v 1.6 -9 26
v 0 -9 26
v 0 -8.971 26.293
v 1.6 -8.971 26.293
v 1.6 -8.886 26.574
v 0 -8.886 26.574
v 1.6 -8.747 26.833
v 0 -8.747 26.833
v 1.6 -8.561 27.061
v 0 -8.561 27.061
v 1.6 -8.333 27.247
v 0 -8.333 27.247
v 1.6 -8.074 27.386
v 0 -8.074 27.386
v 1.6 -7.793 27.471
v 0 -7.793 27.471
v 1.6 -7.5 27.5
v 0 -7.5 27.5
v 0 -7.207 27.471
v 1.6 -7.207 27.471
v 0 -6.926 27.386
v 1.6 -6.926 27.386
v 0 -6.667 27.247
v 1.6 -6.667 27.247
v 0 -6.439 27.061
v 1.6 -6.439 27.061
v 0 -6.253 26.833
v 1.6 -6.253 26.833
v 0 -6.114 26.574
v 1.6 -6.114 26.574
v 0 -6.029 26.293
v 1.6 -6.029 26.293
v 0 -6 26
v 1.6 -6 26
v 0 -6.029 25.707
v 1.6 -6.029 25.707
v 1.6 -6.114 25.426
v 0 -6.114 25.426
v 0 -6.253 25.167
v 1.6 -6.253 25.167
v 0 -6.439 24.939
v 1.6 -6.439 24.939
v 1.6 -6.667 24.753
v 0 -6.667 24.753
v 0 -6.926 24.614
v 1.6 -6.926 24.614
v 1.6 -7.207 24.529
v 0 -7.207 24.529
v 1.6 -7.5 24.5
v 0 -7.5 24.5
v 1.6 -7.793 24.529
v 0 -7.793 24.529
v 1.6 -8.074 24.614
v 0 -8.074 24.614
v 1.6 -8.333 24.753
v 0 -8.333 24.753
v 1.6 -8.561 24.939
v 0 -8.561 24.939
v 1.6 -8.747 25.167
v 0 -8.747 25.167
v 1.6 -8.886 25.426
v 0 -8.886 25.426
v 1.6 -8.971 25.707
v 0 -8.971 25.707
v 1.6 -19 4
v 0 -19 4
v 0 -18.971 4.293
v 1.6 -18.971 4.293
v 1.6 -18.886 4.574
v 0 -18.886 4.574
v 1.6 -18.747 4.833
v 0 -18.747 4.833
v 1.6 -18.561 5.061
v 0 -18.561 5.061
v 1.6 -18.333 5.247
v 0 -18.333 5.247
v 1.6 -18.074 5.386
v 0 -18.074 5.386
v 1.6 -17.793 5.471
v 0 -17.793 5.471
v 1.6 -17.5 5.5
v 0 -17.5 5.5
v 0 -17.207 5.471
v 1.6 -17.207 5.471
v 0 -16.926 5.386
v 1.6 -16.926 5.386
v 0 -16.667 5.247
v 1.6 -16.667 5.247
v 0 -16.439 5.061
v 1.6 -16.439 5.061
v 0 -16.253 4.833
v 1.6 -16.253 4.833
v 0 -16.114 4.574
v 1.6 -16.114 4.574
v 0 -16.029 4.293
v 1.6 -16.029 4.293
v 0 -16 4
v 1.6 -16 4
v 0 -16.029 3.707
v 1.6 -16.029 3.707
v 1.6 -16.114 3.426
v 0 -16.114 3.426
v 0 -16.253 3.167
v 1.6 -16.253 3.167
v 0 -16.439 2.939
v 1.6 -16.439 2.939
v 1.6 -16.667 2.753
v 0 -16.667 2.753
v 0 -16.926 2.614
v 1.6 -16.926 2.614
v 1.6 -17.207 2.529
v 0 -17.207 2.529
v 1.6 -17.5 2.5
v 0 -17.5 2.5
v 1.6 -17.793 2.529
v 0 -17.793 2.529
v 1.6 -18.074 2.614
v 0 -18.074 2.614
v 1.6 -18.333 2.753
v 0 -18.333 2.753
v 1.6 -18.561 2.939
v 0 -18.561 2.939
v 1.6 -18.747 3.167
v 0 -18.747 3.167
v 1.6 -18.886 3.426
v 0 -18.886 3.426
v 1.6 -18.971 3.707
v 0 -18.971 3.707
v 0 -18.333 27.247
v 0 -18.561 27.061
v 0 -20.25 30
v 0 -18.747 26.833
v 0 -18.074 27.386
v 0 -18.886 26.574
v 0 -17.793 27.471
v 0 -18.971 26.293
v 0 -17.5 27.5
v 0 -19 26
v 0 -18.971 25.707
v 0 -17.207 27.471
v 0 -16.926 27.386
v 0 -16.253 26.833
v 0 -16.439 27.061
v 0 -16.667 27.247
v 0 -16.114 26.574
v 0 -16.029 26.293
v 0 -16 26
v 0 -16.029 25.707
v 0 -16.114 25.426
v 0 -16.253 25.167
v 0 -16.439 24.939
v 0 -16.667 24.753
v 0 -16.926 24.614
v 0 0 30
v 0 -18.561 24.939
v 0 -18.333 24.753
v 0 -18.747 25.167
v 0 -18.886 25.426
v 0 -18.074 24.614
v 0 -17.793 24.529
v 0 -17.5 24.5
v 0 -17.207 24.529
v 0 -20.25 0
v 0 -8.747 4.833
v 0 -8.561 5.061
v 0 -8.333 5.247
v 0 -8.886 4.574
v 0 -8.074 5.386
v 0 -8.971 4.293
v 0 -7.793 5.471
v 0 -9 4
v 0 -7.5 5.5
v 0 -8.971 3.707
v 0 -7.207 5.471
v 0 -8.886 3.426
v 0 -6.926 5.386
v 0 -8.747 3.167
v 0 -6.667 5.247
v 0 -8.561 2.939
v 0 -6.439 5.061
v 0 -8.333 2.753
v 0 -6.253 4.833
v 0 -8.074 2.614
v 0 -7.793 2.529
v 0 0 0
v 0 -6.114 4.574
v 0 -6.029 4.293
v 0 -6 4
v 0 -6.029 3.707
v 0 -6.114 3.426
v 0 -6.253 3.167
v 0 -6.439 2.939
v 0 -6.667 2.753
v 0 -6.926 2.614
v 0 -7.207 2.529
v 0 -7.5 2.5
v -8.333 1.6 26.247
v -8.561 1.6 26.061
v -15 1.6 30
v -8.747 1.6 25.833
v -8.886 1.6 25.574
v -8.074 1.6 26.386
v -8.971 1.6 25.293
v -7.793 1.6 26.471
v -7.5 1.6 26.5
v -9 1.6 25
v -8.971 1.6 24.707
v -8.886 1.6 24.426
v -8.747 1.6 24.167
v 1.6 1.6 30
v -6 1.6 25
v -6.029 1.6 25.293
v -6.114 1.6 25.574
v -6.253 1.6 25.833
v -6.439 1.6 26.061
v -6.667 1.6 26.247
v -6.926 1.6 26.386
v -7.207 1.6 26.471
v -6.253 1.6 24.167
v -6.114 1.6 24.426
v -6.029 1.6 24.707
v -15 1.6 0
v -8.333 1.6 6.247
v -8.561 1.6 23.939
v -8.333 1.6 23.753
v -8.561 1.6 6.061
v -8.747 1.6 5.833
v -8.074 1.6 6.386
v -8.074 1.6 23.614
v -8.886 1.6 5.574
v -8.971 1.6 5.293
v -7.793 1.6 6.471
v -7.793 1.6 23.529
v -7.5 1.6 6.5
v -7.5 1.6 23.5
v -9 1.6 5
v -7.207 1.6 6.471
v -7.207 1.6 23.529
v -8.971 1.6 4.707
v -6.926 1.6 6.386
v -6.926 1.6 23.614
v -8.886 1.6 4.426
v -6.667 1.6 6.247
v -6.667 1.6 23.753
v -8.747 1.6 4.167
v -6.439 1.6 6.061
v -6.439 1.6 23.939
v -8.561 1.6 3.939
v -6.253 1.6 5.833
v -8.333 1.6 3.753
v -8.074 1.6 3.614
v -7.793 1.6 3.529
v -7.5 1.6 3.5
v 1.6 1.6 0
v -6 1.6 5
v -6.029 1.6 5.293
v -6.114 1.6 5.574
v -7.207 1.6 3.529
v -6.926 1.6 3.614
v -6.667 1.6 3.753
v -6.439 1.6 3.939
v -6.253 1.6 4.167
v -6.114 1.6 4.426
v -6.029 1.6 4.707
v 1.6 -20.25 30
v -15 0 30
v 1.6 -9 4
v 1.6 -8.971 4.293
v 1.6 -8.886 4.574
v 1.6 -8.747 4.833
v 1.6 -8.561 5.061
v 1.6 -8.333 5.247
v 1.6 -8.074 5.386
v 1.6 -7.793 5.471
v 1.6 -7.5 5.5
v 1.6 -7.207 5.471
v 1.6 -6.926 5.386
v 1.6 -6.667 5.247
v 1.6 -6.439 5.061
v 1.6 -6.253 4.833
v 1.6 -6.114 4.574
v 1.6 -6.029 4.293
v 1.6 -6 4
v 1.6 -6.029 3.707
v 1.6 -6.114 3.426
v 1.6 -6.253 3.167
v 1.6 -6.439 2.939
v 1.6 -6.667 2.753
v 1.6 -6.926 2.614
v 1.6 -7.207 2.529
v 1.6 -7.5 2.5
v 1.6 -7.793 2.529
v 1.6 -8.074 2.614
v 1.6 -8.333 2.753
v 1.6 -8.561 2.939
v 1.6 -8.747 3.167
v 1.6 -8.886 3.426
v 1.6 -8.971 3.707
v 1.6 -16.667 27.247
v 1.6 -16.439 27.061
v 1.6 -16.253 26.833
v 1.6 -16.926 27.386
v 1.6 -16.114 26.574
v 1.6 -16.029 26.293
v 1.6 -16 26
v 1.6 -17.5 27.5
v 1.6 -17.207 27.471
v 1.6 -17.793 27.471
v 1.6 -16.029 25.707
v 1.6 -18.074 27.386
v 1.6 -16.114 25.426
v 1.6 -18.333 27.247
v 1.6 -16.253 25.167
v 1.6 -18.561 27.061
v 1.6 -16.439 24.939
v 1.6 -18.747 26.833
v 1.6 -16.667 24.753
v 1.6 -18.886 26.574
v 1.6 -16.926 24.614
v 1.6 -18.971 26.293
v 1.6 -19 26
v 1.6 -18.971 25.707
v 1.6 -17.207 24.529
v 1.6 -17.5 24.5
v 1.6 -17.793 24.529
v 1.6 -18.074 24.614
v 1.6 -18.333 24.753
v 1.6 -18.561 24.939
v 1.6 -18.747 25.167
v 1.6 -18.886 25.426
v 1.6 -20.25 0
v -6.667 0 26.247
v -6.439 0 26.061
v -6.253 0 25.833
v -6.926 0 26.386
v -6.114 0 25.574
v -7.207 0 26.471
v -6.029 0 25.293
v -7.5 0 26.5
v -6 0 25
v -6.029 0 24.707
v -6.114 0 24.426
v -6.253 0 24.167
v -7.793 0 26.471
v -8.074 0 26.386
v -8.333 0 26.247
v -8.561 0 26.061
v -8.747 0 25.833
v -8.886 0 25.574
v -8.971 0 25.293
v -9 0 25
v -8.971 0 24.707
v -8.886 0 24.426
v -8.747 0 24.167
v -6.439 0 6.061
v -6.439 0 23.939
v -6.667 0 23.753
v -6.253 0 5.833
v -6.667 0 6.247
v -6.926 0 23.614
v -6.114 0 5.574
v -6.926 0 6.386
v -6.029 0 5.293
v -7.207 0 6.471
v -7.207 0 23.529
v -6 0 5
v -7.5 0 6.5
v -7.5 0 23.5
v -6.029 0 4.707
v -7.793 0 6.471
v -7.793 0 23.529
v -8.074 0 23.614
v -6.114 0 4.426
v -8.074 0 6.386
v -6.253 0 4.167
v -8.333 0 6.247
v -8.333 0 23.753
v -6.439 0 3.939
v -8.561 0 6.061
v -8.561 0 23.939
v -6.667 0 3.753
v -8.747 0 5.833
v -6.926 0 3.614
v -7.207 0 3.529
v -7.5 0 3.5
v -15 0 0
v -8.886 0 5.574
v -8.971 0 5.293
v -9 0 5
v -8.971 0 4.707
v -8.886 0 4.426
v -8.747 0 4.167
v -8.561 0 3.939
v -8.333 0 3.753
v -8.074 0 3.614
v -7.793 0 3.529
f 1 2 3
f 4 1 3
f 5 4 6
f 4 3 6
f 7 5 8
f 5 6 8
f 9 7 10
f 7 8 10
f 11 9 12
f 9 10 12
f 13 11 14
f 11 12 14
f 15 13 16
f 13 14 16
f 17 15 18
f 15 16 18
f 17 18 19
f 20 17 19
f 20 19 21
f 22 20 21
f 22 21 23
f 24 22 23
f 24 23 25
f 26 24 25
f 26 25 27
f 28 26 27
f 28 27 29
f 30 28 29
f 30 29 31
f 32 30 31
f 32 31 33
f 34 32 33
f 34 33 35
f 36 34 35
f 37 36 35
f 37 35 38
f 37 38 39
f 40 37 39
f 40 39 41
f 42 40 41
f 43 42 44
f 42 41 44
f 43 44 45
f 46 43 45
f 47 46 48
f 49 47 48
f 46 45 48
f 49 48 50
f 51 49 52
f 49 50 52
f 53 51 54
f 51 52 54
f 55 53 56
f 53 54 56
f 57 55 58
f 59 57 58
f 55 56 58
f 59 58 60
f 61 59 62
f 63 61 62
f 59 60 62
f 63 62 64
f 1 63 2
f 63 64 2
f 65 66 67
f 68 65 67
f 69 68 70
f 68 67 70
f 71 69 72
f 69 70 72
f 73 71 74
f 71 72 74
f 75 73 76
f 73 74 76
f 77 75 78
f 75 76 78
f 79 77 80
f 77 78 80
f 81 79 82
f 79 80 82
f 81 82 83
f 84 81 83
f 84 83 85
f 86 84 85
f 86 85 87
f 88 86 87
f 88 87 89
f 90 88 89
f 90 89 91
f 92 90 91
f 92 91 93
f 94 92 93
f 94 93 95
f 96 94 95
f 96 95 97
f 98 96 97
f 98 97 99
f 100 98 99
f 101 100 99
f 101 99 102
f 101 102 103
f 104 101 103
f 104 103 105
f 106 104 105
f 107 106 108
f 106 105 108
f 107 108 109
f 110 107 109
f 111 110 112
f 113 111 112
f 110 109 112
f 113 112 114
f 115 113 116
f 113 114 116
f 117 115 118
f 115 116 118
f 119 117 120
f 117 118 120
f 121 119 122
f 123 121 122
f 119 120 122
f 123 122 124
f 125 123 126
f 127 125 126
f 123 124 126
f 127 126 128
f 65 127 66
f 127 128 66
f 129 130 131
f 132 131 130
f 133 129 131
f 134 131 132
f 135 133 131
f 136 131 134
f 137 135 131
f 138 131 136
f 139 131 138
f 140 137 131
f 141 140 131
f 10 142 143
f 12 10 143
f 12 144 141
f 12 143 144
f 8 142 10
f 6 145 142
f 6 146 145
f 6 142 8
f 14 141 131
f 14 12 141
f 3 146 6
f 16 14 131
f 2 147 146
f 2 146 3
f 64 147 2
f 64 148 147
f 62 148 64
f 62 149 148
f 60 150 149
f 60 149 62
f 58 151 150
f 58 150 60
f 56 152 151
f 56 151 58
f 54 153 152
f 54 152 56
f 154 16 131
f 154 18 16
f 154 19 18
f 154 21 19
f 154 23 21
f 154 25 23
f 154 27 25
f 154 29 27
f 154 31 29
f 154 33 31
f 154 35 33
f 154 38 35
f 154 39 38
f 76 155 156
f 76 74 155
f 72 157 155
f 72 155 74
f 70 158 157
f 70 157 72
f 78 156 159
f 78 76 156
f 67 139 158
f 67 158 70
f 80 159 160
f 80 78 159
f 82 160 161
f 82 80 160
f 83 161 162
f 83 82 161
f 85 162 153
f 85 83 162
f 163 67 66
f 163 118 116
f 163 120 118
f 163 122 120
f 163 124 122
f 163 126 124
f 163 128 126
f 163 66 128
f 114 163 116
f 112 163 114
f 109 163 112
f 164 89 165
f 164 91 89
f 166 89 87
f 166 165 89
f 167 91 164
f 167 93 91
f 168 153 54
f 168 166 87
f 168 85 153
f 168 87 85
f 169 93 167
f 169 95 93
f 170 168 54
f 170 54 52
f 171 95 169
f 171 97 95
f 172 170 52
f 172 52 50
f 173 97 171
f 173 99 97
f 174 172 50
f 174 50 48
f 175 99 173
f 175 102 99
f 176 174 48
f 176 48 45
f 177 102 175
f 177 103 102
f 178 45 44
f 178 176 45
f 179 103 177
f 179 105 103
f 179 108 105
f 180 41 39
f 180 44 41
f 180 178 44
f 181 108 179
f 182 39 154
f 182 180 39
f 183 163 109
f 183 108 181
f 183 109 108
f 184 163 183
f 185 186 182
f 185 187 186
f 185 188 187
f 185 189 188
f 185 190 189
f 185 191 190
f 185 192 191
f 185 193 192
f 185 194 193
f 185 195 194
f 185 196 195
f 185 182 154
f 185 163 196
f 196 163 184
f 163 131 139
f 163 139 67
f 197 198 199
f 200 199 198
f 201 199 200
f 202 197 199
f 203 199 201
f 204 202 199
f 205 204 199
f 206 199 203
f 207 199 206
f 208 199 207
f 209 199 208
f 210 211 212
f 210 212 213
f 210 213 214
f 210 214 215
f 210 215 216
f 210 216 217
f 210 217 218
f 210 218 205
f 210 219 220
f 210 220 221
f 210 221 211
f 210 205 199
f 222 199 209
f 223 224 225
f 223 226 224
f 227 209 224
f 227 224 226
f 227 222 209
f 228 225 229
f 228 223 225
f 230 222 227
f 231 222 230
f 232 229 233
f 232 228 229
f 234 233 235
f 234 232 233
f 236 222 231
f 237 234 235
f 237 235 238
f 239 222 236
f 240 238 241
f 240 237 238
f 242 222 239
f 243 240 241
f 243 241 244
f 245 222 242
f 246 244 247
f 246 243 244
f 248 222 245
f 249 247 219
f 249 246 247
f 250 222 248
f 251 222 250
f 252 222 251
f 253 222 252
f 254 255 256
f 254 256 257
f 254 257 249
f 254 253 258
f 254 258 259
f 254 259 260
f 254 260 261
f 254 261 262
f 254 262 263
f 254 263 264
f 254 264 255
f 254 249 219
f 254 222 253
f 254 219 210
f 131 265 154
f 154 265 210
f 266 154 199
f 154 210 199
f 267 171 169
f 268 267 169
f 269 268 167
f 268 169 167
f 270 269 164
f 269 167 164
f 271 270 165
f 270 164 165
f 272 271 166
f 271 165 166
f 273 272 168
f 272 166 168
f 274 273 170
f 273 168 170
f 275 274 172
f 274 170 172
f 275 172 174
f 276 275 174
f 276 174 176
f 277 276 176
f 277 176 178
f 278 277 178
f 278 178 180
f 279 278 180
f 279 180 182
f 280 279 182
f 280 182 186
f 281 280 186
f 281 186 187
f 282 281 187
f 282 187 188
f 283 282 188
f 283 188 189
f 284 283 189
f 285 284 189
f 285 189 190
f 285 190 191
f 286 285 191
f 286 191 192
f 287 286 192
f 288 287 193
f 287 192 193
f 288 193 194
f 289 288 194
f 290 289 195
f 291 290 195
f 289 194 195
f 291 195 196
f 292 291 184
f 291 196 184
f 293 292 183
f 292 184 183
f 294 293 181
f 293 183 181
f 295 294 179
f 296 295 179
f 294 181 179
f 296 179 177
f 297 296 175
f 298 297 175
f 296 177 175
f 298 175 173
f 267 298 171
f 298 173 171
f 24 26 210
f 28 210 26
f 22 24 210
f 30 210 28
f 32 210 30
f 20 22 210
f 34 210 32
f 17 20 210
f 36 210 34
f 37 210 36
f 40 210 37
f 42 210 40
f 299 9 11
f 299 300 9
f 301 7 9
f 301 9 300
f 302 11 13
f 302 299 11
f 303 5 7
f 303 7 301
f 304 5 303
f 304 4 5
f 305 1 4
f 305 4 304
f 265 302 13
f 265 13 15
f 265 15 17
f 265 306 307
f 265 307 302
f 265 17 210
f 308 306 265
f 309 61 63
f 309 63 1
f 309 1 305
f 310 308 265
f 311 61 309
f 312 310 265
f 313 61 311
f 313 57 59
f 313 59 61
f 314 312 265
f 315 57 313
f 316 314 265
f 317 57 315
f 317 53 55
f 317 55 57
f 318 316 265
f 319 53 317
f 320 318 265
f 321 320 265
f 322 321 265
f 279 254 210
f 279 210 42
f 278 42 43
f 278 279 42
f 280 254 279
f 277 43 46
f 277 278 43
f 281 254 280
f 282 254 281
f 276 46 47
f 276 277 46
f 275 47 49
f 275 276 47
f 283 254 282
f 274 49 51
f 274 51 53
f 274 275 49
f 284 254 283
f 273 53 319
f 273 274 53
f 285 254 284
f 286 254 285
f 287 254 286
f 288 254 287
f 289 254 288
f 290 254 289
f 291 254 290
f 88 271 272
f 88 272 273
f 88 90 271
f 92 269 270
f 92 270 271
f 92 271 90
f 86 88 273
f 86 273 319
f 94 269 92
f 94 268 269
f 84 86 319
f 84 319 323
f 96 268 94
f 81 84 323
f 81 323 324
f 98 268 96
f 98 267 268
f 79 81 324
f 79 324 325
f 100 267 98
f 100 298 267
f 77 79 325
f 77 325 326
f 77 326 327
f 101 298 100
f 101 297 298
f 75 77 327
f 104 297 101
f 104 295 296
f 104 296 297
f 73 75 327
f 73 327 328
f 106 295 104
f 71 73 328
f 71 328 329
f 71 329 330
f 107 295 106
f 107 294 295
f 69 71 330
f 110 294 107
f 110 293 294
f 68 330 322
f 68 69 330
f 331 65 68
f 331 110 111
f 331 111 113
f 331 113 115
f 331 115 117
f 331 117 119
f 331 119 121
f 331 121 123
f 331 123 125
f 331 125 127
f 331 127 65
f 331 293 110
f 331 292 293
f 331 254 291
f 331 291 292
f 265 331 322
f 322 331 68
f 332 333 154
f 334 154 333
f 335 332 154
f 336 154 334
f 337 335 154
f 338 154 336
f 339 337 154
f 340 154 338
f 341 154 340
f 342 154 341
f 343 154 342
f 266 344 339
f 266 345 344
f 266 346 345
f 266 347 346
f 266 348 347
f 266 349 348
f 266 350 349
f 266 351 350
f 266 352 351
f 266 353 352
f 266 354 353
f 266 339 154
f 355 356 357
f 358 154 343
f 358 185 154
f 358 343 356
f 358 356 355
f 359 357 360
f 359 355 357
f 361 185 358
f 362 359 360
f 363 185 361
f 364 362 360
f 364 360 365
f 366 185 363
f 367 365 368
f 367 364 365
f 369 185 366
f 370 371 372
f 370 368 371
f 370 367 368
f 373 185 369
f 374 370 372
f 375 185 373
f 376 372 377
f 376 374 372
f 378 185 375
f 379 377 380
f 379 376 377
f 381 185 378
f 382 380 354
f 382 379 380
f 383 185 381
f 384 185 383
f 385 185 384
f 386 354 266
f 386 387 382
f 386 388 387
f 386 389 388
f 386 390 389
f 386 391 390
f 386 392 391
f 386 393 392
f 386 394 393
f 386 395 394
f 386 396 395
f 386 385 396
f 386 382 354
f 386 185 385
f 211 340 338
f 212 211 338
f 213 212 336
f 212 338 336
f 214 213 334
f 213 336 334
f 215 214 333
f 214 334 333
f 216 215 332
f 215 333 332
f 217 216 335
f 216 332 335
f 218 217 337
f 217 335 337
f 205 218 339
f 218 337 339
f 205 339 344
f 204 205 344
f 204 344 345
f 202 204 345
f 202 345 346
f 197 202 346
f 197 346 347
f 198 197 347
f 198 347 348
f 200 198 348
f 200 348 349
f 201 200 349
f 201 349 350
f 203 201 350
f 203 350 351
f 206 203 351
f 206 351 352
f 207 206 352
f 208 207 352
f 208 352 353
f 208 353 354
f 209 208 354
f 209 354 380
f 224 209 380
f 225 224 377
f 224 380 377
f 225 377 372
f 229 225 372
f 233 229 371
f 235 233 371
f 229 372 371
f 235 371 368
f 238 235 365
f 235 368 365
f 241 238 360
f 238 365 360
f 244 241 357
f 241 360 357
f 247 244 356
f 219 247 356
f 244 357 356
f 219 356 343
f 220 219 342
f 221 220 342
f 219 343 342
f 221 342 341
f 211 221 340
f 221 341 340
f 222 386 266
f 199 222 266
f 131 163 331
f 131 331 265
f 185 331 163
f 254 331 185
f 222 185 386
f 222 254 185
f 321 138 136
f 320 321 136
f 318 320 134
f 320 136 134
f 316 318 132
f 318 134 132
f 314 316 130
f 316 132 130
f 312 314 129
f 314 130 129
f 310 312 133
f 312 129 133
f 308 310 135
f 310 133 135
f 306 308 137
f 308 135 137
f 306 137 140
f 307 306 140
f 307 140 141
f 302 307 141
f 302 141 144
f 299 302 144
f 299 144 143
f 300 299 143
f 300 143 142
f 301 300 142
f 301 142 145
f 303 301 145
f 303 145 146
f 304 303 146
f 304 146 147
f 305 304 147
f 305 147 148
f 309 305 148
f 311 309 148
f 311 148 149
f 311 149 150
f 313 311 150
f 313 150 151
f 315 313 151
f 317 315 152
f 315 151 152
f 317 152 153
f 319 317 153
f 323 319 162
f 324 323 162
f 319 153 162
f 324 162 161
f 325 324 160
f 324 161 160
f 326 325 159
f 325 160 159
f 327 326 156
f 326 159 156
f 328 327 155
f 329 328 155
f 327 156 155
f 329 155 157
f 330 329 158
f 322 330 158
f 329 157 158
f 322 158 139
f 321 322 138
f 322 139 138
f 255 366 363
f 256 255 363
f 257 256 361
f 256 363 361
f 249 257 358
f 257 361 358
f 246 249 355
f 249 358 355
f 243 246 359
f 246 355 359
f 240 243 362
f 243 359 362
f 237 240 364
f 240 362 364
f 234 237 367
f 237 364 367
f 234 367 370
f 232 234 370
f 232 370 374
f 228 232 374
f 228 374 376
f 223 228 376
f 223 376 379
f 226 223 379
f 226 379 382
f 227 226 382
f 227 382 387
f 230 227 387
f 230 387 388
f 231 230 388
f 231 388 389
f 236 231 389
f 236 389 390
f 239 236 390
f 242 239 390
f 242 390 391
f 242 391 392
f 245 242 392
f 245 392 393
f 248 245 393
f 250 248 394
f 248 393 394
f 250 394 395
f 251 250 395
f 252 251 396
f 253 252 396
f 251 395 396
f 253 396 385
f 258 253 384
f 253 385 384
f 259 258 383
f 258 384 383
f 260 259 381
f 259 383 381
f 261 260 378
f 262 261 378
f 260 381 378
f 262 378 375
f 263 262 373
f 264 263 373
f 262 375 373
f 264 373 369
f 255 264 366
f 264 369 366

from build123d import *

# Parameters (mm, degrees)
ANGLE_DEPTH        = 30
SKETCH2_R          = 1.5
CUT_EXTRUDE1_DEPTH = 50
SKETCH3_R          = 1.5
CUT_EXTRUDE2_DEPTH = 50
SKETCH4_W          = 30
SKETCH4_H          = 3.15
CUT_EXTRUDE3_DEPTH = 50
SKETCH5_W          = 8.4
SKETCH5_H          = 30
CUT_EXTRUDE4_DEPTH = 50


with BuildPart() as part:
    # Sketch1 → Angle (new body)
    with BuildSketch(Plane.XY):
        Polygon((0, 0), (-23.4, 0), (-23.4, 1.6), (1.6, 1.6), (1.6, -23.4), (0, -23.4), align=None)
    extrude(amount=ANGLE_DEPTH)

    # Sketch2 → Cut-Extrude1 (cut)
    with BuildSketch(Plane.XZ):
        with Locations((-7.5, 5)):
            Circle(SKETCH2_R)
        with Locations((-7.5, 25)):
            Circle(SKETCH2_R)
    extrude(amount=-CUT_EXTRUDE1_DEPTH, mode=Mode.SUBTRACT)

    # Sketch3 → Cut-Extrude2 (cut)
    with BuildSketch(Plane.ZY):
        with Locations(Location((4, -7.5, 0), (0, 0, 270))):
            Circle(SKETCH3_R)
        with Locations(Location((26, -7.5, 0), (0, 0, 270))):
            Circle(SKETCH3_R)
        with Locations(Location((4, -17.5, 0), (0, 0, 270))):
            Circle(SKETCH3_R)
        with Locations(Location((26, -17.5, 0), (0, 0, 270))):
            Circle(SKETCH3_R)
    extrude(amount=-CUT_EXTRUDE2_DEPTH, mode=Mode.SUBTRACT)

    # Sketch4 → Cut-Extrude3 (cut)
    with BuildSketch(Plane.ZY):
        with Locations((15, -21.825)):
            Rectangle(SKETCH4_W, SKETCH4_H)
    extrude(amount=-CUT_EXTRUDE3_DEPTH, mode=Mode.SUBTRACT)

    # Sketch5 → Cut-Extrude4 (cut)
    with BuildSketch(Plane.XZ):
        with Locations((-19.2, 15)):
            Rectangle(SKETCH5_W, SKETCH5_H)
    extrude(amount=-CUT_EXTRUDE4_DEPTH, mode=Mode.SUBTRACT)


solid = part.part
